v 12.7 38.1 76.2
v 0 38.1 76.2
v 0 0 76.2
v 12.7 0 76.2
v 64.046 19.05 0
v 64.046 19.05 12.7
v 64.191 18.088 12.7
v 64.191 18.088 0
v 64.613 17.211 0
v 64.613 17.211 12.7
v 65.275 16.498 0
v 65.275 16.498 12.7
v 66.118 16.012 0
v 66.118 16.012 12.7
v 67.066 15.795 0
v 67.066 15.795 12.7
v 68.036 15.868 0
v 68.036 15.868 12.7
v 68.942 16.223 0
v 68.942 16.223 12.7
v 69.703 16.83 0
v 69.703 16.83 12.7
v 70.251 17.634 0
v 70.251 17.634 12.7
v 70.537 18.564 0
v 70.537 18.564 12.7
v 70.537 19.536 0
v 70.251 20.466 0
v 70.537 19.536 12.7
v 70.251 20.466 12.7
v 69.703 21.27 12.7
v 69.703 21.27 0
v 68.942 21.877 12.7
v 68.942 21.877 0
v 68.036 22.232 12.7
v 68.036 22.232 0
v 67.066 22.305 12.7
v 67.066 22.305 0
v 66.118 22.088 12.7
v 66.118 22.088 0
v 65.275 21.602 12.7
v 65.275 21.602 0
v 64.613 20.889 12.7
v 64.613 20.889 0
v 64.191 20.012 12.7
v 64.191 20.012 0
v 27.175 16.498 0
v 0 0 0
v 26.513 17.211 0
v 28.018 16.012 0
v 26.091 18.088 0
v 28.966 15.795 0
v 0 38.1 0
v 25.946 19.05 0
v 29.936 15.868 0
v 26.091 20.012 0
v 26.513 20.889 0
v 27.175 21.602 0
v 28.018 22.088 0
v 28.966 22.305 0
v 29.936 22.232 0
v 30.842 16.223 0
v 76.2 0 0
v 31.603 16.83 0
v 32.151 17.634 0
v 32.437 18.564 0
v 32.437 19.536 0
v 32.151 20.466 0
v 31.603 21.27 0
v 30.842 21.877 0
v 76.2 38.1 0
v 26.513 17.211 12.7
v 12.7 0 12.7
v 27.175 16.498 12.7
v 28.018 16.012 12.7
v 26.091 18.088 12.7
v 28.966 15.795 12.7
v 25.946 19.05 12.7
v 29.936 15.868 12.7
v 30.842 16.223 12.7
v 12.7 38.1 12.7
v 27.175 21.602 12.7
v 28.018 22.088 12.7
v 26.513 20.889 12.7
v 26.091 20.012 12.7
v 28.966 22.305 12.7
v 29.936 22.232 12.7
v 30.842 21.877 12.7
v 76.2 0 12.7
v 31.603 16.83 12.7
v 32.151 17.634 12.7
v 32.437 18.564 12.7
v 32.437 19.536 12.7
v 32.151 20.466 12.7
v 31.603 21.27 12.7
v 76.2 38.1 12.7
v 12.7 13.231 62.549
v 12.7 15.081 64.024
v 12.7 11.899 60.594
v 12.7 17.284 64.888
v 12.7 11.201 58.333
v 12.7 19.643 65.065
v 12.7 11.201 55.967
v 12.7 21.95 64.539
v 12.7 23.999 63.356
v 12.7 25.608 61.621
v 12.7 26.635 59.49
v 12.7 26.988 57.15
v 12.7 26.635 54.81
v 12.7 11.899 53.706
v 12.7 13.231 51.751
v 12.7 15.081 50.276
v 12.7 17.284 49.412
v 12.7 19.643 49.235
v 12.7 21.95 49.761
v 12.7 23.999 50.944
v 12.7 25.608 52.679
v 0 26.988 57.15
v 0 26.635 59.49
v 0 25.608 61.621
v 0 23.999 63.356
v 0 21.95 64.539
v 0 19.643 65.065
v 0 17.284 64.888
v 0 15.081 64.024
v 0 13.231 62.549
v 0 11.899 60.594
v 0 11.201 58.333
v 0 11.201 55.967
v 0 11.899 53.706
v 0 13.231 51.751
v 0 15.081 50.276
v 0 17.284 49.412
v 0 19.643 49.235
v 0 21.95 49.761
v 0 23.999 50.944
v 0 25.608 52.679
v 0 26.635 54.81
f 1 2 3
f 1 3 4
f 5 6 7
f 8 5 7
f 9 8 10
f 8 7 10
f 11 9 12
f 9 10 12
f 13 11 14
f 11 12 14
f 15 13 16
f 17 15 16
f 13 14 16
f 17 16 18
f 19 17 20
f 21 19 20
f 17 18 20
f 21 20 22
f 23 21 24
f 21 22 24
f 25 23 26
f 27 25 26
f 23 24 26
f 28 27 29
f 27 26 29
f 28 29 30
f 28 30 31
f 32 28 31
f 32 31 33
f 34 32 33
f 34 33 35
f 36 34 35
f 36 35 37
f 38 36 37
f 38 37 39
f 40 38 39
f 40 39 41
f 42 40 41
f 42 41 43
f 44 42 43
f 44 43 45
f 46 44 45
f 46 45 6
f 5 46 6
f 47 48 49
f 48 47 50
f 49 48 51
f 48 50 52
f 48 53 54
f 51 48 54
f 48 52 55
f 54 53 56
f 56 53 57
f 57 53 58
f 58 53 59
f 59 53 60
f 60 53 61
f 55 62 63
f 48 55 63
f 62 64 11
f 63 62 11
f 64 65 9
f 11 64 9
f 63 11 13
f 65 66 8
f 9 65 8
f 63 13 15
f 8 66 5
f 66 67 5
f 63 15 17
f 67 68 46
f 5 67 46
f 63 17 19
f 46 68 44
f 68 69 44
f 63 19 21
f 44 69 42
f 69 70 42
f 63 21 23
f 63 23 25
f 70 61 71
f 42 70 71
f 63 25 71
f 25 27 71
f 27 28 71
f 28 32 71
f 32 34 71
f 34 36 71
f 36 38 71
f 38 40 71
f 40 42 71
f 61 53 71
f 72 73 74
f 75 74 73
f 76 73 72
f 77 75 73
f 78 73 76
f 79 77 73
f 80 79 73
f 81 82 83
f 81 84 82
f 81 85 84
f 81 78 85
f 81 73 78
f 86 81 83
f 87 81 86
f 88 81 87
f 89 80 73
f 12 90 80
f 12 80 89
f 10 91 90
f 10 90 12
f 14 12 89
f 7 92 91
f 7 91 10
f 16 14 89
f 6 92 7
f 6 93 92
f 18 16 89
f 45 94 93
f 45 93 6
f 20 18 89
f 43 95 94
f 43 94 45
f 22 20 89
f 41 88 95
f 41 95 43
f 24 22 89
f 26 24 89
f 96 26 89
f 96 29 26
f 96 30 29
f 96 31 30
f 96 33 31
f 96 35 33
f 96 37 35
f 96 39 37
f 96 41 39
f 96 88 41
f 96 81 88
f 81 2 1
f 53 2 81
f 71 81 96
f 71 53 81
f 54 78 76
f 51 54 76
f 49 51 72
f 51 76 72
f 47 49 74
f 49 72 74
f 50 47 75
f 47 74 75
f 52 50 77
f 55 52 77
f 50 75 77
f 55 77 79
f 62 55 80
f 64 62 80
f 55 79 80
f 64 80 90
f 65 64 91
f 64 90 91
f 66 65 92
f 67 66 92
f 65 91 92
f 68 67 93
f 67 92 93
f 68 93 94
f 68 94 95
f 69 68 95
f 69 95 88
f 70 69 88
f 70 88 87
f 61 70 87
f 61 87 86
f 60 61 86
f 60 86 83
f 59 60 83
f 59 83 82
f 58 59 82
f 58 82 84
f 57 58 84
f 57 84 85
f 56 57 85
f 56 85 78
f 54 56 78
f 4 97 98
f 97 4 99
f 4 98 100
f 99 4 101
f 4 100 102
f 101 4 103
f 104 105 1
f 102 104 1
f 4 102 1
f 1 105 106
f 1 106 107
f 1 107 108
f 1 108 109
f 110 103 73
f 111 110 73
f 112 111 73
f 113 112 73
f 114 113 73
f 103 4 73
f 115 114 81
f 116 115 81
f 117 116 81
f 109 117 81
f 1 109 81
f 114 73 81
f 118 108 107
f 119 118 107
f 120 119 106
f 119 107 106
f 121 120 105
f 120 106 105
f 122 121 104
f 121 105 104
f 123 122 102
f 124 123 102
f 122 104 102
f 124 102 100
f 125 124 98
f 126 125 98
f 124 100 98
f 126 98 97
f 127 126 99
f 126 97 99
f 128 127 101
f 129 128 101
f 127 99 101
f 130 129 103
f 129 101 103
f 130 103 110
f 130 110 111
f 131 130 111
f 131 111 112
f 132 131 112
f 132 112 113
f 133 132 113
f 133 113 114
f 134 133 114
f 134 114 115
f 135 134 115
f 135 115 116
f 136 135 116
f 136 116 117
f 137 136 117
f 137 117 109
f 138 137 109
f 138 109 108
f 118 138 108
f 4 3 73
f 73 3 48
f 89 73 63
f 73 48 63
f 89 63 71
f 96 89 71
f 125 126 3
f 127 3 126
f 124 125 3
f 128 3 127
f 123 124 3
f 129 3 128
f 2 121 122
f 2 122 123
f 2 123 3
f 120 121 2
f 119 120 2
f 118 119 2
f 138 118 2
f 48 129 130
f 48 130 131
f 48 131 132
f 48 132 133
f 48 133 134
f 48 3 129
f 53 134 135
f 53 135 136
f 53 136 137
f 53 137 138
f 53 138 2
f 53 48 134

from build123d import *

# Parameters (mm, degrees)
F0_W     = 76.2
F0_H     = 38.1
F1_DEPTH = 12.7
F2_W     = 12.7
F2_H     = 38.1
F3_DEPTH = 63.5
F5_D     = 15.875
F7_D     = 6.5278


with BuildPart() as f1:
    # F0 (on Top) → F1 (new body)
    with BuildSketch(Plane.XY):
        with Locations((38.1, 19.05)):
            Rectangle(F0_W, F0_H)
    extrude(amount=F1_DEPTH)

    # F2 (on face) → F3 (join)
    with BuildSketch(Plane.XY.offset(12.7)):
        with Locations((6.35, 19.05)):
            Rectangle(F2_W, F2_H)
    extrude(amount=F3_DEPTH)

    # F5 (through all)
    with Locations(Plane(origin=(0, 0, 0), x_dir=(0, -1, 0), z_dir=(-1, 0, 0))):
        with Locations((-19.05, 57.15)):
            Hole(F5_D / 2)

    # F7 (through all)
    with Locations(Plane(origin=(0, 0, 0), x_dir=(1, 0, 0), z_dir=(0, 0, -1))):
        with Locations((67.31, -19.05), (29.21, -19.05)):
            Hole(F7_D / 2)


solid = f1.part
